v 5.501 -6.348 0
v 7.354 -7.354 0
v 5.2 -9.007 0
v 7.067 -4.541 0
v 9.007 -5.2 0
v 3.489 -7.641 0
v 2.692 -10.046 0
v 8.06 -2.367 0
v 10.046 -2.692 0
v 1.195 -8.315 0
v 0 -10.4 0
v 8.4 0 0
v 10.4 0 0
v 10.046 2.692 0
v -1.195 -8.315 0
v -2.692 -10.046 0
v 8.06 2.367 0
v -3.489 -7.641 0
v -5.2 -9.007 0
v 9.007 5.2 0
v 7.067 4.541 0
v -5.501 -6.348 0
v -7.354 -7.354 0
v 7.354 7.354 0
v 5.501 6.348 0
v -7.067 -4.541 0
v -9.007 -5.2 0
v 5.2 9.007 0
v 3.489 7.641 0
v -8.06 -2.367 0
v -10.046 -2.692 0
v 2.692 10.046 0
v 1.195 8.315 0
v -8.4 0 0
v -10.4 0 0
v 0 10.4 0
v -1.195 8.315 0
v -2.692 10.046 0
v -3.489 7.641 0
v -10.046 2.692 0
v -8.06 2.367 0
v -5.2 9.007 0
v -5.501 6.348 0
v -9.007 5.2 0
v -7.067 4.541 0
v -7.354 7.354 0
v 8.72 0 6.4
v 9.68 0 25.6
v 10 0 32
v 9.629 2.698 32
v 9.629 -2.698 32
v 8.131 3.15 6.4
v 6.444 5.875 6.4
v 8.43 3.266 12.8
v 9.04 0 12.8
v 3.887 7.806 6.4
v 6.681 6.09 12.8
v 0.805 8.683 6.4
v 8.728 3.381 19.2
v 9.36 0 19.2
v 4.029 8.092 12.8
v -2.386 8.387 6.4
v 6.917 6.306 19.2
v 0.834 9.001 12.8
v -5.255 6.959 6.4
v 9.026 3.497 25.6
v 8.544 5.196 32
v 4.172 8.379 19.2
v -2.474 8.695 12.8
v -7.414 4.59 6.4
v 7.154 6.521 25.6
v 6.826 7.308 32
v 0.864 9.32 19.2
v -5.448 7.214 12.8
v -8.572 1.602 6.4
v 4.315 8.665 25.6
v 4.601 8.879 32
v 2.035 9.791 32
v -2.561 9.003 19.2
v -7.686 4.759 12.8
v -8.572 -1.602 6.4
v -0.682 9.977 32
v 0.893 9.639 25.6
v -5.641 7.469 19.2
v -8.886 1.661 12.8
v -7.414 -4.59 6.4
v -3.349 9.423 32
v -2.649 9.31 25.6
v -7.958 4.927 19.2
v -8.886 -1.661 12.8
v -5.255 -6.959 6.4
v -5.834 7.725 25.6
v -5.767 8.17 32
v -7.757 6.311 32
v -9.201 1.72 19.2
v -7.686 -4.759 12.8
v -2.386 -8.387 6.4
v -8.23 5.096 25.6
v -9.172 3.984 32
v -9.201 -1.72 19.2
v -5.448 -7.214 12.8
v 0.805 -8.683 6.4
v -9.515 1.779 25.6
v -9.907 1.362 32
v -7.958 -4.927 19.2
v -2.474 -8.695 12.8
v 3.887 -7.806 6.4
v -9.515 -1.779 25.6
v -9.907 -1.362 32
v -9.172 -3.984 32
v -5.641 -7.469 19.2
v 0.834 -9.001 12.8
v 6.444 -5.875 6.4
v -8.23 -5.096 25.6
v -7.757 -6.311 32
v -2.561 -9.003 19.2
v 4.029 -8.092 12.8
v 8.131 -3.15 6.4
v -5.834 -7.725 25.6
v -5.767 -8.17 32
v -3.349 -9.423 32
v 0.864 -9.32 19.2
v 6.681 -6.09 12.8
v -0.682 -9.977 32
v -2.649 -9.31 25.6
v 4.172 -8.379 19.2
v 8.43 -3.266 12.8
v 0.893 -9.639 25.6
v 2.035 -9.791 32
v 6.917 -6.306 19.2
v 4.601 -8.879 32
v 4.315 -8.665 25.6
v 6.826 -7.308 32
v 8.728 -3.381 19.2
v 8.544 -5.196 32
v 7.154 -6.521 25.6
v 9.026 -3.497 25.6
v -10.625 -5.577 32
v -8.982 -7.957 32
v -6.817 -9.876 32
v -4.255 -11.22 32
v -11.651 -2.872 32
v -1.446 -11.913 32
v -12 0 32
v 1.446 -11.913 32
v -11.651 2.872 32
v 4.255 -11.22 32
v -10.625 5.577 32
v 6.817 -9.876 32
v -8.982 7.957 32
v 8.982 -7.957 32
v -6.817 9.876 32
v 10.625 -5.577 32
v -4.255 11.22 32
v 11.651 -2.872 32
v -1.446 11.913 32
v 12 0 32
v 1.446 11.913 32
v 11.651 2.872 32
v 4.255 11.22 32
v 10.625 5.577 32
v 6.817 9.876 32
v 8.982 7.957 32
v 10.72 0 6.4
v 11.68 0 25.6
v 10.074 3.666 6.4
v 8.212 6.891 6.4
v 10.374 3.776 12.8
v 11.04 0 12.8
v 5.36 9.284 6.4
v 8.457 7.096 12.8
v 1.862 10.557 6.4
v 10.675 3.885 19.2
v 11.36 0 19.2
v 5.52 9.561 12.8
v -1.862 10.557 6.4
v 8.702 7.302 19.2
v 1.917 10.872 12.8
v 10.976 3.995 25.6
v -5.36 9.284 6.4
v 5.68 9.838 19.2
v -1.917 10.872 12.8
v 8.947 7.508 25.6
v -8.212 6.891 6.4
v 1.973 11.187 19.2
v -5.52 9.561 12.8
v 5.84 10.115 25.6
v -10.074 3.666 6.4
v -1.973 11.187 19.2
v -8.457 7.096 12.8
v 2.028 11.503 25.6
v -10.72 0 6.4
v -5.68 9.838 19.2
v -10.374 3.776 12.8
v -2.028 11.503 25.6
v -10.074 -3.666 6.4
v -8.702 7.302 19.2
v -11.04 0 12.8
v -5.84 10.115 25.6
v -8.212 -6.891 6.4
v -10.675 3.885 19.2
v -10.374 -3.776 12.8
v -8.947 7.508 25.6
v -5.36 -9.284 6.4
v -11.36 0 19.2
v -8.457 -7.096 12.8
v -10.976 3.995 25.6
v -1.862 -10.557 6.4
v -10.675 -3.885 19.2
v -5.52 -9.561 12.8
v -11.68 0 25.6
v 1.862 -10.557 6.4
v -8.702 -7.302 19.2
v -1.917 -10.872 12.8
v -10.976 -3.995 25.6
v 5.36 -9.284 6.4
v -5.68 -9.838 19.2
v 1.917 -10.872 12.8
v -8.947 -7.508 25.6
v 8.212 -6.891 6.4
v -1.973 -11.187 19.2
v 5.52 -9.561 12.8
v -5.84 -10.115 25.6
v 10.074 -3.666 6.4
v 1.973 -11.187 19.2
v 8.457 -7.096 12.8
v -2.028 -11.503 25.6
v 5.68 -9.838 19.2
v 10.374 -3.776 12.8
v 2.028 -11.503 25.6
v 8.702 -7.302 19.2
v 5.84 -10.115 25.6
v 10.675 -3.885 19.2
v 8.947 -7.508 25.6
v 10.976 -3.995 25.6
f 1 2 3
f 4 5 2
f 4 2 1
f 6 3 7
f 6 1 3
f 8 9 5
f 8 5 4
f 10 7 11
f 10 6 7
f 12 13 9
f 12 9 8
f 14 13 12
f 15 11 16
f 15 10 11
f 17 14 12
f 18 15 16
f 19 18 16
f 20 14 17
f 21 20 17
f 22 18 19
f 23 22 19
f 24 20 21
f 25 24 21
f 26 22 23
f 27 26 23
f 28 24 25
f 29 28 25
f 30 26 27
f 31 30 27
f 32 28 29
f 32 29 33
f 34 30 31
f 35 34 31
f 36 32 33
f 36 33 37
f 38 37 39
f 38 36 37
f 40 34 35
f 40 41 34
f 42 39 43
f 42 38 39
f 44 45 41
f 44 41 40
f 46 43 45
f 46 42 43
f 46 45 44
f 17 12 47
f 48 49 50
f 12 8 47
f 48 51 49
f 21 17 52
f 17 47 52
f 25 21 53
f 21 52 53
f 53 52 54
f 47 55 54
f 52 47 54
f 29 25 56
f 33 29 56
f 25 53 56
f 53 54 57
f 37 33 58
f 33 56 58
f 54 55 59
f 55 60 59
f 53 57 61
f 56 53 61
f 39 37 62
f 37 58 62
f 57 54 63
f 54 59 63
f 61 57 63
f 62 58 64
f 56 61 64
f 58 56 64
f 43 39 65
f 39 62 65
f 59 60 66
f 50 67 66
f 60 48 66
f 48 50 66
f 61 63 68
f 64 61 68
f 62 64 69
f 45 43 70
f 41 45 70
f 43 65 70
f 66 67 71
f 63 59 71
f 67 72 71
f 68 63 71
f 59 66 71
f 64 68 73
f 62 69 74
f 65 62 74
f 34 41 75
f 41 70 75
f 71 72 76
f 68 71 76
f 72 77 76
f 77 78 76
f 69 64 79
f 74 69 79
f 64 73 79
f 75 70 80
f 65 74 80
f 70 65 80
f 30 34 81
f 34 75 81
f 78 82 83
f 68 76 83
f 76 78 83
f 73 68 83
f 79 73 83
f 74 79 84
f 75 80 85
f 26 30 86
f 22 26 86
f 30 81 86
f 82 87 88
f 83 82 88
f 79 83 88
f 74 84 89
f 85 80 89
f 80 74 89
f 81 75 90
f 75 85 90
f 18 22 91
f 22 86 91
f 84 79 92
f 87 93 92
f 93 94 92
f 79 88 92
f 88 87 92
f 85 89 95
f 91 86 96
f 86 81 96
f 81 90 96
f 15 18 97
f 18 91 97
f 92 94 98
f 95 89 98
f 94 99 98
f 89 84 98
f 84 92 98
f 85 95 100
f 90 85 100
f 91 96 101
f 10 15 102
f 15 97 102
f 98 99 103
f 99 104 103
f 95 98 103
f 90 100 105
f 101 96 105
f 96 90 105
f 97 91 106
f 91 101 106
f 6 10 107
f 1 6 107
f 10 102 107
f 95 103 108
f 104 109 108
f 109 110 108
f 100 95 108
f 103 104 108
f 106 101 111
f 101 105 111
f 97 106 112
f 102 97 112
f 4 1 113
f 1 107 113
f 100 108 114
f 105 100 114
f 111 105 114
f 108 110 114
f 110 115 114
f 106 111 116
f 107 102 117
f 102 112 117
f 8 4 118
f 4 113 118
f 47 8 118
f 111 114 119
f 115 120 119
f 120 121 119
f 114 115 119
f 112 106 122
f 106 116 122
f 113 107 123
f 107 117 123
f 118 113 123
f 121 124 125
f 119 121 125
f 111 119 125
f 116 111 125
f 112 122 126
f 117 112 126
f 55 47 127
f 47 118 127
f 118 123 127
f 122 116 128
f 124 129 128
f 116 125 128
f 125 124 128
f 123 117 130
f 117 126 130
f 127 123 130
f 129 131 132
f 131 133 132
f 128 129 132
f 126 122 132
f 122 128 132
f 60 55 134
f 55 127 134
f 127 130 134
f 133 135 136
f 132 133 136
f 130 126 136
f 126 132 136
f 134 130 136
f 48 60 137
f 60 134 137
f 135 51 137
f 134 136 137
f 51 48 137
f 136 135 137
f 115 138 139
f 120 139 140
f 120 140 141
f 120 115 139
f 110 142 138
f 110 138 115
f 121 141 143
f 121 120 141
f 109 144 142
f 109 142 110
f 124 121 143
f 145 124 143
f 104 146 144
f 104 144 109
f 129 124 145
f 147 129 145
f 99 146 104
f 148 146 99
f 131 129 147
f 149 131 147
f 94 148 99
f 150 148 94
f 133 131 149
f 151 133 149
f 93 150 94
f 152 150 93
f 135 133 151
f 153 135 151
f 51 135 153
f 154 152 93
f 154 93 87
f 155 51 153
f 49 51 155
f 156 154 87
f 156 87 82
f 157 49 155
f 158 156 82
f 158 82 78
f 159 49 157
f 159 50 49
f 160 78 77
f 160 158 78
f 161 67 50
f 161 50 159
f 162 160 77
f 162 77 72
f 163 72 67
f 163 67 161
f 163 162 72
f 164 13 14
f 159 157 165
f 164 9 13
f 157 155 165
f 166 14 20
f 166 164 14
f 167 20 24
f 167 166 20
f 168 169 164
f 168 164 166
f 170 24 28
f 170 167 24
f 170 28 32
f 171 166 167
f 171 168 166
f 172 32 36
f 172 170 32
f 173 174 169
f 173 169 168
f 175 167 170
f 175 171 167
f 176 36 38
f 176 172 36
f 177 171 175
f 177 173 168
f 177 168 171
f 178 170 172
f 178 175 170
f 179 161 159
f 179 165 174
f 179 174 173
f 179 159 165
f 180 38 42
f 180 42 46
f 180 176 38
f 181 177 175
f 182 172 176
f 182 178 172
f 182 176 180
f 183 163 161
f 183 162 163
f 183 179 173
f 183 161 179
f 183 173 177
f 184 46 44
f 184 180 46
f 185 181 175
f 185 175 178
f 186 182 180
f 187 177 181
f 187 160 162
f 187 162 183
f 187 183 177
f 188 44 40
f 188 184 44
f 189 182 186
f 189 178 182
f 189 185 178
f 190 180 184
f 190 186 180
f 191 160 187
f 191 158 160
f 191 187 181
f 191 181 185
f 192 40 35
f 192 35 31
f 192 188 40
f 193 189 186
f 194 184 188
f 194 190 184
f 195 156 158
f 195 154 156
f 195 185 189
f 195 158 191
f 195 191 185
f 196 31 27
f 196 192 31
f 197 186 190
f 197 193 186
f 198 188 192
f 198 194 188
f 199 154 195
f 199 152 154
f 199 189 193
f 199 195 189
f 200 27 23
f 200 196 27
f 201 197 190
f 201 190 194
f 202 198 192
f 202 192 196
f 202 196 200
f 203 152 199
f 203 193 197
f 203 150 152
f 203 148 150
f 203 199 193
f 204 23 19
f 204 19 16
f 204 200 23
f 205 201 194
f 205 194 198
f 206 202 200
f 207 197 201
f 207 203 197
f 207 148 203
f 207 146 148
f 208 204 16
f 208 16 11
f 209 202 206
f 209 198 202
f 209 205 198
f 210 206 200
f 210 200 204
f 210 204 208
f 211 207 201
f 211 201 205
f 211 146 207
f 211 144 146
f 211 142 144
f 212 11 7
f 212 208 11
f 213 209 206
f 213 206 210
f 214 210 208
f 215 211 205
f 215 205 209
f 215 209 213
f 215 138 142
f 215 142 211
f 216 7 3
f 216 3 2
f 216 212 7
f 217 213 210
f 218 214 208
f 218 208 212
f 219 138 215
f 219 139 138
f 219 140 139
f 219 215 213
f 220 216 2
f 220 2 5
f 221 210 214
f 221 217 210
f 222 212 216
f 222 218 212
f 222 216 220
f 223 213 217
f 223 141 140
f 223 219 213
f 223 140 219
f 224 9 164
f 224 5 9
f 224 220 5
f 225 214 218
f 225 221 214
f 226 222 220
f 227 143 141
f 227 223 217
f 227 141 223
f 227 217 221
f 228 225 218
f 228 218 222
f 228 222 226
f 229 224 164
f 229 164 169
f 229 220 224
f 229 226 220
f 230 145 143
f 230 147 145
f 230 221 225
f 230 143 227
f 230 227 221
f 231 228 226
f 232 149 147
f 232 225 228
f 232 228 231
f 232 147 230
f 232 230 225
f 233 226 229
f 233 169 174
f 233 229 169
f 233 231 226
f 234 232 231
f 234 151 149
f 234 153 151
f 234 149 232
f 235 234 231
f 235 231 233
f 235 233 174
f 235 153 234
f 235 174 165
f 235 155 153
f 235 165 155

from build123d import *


with BuildPart() as cone001:
    # Cone001 → Cone001 (revolve)
    with BuildSketch(Plane.XZ):
        Polygon((0, 0), (8.4, 0), (10, 32), (0, 32), align=None)
    revolve(axis=Axis((0, 0, 0), (0, 0, 1)))


with BuildPart() as groundzone:
    # Cone002 → Cone002 (revolve)
    with BuildSketch(Plane(origin=(0, 0, 2), x_dir=(1, 0, 0), z_dir=(0, -1, 0))):
        Polygon((0, 0), (10.5, 0), (11.9, 28), (0, 28), align=None)
    revolve(axis=Axis((0, 0, 2), (0, 0, 1)))


with BuildPart() as is383_joint:
    # Cone → Cone (revolve)
    with BuildSketch(Plane.XZ):
        Polygon((0, 0), (10.4, 0), (12, 32), (0, 32), align=None)
    revolve(axis=Axis((0, 0, 0), (0, 0, 1)))

    # Fusion: union GroundZone
    add(groundzone.part)

    # Cut: cut Cone001
    add(cone001.part, mode=Mode.SUBTRACT)


solid = is383_joint.part
